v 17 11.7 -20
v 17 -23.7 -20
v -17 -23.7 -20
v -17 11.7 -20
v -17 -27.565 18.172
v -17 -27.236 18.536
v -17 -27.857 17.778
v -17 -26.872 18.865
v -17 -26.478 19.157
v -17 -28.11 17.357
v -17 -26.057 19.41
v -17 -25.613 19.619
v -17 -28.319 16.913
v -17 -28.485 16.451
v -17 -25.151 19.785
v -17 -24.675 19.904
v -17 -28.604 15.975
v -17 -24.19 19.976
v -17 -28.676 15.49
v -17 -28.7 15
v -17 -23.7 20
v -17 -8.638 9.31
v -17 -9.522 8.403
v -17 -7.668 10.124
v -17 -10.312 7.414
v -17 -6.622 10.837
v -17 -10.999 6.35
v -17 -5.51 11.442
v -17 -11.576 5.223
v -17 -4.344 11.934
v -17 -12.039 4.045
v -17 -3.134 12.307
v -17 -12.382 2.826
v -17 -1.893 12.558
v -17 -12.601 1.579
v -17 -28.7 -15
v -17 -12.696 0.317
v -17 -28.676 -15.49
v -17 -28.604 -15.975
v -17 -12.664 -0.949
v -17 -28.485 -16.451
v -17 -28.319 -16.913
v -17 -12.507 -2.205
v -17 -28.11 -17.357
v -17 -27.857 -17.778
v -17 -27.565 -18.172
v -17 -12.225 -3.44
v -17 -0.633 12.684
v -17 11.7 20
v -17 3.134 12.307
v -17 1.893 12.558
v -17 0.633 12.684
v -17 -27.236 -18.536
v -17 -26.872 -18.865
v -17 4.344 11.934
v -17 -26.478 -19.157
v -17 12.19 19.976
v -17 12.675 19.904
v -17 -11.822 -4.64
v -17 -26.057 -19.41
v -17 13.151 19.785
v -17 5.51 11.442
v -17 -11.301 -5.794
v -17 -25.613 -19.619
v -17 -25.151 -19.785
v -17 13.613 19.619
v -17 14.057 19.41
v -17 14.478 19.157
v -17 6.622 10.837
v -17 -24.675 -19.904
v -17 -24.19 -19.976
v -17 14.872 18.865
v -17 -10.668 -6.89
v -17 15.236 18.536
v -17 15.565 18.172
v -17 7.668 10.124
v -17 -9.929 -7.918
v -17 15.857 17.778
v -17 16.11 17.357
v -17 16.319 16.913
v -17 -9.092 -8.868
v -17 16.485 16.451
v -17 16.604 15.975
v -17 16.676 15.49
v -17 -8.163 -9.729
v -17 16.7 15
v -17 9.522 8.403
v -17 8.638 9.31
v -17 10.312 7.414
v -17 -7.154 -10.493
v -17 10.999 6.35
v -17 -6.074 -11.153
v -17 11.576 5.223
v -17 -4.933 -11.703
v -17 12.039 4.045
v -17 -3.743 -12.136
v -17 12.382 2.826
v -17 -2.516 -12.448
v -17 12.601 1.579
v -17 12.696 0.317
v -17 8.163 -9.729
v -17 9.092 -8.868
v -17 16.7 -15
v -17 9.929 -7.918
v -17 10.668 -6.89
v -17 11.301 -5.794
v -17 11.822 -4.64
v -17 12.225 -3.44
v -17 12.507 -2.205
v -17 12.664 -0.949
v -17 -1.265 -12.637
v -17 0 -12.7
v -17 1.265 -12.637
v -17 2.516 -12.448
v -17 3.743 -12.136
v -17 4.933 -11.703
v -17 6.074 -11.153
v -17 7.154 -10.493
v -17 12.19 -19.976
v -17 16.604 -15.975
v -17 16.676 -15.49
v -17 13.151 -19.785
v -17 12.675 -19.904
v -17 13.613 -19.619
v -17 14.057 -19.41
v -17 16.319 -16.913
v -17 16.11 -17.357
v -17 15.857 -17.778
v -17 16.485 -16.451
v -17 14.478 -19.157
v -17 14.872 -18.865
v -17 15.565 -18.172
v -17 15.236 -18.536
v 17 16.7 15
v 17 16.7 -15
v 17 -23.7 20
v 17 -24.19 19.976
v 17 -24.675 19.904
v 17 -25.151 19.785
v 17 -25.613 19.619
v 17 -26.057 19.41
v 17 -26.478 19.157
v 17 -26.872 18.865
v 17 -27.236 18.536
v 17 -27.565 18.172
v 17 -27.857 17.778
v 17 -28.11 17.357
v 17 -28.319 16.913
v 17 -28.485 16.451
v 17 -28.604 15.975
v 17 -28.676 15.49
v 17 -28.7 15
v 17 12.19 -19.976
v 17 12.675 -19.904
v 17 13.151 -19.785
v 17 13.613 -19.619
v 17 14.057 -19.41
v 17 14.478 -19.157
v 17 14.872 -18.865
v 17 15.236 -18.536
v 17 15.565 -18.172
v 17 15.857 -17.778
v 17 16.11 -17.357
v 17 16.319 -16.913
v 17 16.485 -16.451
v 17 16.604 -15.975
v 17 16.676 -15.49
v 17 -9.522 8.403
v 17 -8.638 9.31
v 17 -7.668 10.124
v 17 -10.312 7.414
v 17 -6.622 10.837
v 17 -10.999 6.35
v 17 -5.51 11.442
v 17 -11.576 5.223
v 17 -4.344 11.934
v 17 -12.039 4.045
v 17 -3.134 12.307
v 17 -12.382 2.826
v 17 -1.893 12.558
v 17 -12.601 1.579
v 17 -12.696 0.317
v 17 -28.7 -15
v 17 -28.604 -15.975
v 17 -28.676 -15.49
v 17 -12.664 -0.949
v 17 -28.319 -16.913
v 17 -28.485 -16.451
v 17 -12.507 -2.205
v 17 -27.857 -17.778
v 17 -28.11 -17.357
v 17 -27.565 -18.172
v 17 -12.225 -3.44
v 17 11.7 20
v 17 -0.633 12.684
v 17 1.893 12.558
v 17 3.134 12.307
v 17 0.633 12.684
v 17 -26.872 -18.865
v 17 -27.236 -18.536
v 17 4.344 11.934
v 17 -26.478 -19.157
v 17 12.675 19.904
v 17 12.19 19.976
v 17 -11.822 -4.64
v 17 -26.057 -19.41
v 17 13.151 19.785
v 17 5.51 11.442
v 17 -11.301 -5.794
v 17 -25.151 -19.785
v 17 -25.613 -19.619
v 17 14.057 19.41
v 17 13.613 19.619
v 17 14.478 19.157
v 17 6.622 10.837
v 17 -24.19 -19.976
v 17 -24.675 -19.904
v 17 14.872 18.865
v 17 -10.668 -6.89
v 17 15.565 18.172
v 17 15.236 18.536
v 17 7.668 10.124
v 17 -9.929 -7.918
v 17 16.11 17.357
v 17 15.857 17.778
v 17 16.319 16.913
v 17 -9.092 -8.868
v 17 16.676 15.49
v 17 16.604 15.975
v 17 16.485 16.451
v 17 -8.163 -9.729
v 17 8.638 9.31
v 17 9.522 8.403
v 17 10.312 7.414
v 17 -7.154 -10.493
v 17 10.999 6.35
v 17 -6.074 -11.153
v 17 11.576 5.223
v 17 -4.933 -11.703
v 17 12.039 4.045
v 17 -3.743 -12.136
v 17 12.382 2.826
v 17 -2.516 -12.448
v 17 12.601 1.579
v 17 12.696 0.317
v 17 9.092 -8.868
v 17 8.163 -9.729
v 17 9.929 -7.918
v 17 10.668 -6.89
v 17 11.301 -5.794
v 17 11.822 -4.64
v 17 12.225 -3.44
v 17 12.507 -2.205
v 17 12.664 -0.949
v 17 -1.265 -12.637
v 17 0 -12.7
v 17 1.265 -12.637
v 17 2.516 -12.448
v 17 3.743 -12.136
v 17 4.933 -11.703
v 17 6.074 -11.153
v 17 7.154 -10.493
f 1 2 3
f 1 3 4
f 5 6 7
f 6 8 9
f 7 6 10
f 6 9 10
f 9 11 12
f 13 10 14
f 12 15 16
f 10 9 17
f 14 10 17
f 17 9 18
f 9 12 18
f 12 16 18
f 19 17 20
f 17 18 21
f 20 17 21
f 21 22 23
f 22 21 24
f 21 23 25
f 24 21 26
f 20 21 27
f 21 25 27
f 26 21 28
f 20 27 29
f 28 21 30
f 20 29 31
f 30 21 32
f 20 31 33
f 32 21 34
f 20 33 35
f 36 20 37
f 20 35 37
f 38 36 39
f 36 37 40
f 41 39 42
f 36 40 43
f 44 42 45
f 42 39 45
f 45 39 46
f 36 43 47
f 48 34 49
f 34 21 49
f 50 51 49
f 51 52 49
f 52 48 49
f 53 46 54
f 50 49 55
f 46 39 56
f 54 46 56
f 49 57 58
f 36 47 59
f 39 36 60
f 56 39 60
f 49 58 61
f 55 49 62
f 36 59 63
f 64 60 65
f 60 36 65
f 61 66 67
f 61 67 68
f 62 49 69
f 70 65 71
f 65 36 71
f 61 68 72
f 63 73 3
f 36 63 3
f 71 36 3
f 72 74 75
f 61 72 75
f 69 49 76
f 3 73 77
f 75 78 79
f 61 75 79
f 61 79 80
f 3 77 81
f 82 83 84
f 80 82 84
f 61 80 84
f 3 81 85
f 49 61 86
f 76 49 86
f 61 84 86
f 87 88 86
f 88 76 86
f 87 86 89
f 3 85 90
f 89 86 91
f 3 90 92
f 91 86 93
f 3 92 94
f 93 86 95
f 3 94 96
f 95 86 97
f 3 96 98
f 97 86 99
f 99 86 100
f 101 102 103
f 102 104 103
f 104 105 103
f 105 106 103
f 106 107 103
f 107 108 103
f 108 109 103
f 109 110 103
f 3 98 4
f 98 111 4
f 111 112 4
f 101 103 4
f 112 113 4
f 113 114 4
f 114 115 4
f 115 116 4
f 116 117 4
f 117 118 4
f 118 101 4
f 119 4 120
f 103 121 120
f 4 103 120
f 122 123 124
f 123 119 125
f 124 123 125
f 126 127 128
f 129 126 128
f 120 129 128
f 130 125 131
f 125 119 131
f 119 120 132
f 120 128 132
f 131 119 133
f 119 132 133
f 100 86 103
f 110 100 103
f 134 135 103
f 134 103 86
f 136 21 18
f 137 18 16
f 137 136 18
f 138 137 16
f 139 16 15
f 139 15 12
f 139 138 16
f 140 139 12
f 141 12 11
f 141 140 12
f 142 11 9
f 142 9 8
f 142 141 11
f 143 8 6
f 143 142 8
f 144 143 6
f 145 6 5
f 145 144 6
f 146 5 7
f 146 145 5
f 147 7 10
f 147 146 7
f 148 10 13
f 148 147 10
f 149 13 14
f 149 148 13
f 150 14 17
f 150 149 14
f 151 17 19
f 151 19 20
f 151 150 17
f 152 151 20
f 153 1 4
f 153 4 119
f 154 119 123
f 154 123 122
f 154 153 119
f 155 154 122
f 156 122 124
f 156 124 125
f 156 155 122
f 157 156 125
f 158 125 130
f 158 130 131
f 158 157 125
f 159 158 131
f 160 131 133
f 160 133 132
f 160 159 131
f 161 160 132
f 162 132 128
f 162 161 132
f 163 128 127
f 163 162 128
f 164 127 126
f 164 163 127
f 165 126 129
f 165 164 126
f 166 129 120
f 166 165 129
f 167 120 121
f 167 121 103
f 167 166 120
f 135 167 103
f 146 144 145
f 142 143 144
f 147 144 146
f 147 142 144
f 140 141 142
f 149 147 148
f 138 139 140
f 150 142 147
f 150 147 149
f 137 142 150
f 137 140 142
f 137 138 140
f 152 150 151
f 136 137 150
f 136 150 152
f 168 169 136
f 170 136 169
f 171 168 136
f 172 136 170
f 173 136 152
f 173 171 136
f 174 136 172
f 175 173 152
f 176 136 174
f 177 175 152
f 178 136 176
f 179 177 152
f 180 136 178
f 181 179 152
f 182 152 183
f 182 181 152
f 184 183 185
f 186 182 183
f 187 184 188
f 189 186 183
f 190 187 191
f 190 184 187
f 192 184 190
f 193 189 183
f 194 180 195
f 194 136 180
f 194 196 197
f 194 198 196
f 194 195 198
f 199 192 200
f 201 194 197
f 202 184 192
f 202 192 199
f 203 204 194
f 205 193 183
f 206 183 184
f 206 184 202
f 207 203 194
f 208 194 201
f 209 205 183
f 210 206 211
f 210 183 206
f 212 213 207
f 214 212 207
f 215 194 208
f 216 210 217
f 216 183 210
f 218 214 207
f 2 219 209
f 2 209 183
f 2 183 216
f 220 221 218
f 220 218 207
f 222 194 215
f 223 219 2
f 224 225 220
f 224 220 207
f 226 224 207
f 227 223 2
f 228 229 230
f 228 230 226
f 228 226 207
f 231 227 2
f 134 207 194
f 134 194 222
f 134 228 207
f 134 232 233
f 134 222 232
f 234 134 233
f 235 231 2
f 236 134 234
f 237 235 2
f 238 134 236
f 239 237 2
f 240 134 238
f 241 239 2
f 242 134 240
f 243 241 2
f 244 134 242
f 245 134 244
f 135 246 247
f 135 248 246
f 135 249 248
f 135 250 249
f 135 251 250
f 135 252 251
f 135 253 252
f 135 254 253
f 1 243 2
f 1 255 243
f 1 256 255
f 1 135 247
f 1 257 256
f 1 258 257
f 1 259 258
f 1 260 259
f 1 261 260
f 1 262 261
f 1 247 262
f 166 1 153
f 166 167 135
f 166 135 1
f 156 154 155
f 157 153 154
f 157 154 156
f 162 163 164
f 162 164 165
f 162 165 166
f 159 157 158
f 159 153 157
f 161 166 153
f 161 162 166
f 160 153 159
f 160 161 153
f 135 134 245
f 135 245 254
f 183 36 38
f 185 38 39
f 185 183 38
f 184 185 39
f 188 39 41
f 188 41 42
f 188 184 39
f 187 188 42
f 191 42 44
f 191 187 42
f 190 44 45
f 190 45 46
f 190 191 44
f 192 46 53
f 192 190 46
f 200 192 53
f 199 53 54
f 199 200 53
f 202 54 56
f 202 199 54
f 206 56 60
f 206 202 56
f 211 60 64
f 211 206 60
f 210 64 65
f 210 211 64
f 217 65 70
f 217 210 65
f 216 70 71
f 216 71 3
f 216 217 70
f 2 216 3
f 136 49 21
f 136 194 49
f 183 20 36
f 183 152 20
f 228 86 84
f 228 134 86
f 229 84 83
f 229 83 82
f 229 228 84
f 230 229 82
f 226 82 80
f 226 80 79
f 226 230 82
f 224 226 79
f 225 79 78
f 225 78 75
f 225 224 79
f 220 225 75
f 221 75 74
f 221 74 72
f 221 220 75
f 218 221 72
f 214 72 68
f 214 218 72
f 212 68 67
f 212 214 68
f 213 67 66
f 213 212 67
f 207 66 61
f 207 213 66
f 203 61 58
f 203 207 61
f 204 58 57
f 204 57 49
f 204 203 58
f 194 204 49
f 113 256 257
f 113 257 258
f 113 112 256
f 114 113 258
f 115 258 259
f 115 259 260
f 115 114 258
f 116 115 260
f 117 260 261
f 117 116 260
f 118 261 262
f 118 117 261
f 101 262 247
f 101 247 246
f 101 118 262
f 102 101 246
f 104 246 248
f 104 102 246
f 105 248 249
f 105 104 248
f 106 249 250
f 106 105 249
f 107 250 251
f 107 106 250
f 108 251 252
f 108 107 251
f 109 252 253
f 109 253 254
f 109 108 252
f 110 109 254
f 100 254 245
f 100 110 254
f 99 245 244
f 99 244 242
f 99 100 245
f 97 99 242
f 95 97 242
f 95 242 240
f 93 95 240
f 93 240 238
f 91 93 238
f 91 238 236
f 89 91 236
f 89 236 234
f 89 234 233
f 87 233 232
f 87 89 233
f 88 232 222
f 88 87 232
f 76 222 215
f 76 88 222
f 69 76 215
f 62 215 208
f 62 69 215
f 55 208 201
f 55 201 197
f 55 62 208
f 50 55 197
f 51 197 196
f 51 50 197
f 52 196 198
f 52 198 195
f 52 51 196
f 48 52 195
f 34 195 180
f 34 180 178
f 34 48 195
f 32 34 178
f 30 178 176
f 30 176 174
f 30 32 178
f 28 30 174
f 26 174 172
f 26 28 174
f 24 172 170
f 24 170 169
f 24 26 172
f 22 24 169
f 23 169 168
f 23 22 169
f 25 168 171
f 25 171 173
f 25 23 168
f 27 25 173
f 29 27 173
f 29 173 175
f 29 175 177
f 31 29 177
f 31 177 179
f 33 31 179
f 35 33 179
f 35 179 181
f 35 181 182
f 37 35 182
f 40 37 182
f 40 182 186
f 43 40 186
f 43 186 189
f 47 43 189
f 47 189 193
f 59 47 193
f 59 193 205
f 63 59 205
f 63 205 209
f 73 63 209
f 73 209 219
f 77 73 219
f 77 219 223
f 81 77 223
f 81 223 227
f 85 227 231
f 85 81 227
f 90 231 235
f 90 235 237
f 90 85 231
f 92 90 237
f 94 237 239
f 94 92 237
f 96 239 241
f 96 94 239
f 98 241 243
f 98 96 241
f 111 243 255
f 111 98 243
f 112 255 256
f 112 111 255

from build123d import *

# Parameters (mm, degrees)
SKETCH1_R           = 12.7
BOSS_EXTRUDE1_DEPTH = 17


with BuildPart() as part:
    # Sketch1 → Boss-Extrude1 (new, symmetric)
    with BuildSketch(Plane(origin=(0, 0, 0), x_dir=(0, 0, -1), z_dir=(1, 0, 0))):
        with BuildLine():
            Line((-15, -28.7), (15, -28.7))
            ThreePointArc((15, -28.7), (18.535533906, -27.235533906), (20, -23.7))
            Line((20, -23.7), (20, 11.7))
            ThreePointArc((20, 11.7), (18.535533906, 15.235533906), (15, 16.7))
            Line((15, 16.7), (-15, 16.7))
            ThreePointArc((-15, 16.7), (-18.535533906, 15.235533906), (-20, 11.7))
            Line((-20, 11.7), (-20, -23.7))
            ThreePointArc((-20, -23.7), (-18.535533906, -27.235533906), (-15, -28.7))
        make_face()
        Circle(SKETCH1_R, mode=Mode.SUBTRACT)
    extrude(amount=BOSS_EXTRUDE1_DEPTH, both=True)


solid = part.part
